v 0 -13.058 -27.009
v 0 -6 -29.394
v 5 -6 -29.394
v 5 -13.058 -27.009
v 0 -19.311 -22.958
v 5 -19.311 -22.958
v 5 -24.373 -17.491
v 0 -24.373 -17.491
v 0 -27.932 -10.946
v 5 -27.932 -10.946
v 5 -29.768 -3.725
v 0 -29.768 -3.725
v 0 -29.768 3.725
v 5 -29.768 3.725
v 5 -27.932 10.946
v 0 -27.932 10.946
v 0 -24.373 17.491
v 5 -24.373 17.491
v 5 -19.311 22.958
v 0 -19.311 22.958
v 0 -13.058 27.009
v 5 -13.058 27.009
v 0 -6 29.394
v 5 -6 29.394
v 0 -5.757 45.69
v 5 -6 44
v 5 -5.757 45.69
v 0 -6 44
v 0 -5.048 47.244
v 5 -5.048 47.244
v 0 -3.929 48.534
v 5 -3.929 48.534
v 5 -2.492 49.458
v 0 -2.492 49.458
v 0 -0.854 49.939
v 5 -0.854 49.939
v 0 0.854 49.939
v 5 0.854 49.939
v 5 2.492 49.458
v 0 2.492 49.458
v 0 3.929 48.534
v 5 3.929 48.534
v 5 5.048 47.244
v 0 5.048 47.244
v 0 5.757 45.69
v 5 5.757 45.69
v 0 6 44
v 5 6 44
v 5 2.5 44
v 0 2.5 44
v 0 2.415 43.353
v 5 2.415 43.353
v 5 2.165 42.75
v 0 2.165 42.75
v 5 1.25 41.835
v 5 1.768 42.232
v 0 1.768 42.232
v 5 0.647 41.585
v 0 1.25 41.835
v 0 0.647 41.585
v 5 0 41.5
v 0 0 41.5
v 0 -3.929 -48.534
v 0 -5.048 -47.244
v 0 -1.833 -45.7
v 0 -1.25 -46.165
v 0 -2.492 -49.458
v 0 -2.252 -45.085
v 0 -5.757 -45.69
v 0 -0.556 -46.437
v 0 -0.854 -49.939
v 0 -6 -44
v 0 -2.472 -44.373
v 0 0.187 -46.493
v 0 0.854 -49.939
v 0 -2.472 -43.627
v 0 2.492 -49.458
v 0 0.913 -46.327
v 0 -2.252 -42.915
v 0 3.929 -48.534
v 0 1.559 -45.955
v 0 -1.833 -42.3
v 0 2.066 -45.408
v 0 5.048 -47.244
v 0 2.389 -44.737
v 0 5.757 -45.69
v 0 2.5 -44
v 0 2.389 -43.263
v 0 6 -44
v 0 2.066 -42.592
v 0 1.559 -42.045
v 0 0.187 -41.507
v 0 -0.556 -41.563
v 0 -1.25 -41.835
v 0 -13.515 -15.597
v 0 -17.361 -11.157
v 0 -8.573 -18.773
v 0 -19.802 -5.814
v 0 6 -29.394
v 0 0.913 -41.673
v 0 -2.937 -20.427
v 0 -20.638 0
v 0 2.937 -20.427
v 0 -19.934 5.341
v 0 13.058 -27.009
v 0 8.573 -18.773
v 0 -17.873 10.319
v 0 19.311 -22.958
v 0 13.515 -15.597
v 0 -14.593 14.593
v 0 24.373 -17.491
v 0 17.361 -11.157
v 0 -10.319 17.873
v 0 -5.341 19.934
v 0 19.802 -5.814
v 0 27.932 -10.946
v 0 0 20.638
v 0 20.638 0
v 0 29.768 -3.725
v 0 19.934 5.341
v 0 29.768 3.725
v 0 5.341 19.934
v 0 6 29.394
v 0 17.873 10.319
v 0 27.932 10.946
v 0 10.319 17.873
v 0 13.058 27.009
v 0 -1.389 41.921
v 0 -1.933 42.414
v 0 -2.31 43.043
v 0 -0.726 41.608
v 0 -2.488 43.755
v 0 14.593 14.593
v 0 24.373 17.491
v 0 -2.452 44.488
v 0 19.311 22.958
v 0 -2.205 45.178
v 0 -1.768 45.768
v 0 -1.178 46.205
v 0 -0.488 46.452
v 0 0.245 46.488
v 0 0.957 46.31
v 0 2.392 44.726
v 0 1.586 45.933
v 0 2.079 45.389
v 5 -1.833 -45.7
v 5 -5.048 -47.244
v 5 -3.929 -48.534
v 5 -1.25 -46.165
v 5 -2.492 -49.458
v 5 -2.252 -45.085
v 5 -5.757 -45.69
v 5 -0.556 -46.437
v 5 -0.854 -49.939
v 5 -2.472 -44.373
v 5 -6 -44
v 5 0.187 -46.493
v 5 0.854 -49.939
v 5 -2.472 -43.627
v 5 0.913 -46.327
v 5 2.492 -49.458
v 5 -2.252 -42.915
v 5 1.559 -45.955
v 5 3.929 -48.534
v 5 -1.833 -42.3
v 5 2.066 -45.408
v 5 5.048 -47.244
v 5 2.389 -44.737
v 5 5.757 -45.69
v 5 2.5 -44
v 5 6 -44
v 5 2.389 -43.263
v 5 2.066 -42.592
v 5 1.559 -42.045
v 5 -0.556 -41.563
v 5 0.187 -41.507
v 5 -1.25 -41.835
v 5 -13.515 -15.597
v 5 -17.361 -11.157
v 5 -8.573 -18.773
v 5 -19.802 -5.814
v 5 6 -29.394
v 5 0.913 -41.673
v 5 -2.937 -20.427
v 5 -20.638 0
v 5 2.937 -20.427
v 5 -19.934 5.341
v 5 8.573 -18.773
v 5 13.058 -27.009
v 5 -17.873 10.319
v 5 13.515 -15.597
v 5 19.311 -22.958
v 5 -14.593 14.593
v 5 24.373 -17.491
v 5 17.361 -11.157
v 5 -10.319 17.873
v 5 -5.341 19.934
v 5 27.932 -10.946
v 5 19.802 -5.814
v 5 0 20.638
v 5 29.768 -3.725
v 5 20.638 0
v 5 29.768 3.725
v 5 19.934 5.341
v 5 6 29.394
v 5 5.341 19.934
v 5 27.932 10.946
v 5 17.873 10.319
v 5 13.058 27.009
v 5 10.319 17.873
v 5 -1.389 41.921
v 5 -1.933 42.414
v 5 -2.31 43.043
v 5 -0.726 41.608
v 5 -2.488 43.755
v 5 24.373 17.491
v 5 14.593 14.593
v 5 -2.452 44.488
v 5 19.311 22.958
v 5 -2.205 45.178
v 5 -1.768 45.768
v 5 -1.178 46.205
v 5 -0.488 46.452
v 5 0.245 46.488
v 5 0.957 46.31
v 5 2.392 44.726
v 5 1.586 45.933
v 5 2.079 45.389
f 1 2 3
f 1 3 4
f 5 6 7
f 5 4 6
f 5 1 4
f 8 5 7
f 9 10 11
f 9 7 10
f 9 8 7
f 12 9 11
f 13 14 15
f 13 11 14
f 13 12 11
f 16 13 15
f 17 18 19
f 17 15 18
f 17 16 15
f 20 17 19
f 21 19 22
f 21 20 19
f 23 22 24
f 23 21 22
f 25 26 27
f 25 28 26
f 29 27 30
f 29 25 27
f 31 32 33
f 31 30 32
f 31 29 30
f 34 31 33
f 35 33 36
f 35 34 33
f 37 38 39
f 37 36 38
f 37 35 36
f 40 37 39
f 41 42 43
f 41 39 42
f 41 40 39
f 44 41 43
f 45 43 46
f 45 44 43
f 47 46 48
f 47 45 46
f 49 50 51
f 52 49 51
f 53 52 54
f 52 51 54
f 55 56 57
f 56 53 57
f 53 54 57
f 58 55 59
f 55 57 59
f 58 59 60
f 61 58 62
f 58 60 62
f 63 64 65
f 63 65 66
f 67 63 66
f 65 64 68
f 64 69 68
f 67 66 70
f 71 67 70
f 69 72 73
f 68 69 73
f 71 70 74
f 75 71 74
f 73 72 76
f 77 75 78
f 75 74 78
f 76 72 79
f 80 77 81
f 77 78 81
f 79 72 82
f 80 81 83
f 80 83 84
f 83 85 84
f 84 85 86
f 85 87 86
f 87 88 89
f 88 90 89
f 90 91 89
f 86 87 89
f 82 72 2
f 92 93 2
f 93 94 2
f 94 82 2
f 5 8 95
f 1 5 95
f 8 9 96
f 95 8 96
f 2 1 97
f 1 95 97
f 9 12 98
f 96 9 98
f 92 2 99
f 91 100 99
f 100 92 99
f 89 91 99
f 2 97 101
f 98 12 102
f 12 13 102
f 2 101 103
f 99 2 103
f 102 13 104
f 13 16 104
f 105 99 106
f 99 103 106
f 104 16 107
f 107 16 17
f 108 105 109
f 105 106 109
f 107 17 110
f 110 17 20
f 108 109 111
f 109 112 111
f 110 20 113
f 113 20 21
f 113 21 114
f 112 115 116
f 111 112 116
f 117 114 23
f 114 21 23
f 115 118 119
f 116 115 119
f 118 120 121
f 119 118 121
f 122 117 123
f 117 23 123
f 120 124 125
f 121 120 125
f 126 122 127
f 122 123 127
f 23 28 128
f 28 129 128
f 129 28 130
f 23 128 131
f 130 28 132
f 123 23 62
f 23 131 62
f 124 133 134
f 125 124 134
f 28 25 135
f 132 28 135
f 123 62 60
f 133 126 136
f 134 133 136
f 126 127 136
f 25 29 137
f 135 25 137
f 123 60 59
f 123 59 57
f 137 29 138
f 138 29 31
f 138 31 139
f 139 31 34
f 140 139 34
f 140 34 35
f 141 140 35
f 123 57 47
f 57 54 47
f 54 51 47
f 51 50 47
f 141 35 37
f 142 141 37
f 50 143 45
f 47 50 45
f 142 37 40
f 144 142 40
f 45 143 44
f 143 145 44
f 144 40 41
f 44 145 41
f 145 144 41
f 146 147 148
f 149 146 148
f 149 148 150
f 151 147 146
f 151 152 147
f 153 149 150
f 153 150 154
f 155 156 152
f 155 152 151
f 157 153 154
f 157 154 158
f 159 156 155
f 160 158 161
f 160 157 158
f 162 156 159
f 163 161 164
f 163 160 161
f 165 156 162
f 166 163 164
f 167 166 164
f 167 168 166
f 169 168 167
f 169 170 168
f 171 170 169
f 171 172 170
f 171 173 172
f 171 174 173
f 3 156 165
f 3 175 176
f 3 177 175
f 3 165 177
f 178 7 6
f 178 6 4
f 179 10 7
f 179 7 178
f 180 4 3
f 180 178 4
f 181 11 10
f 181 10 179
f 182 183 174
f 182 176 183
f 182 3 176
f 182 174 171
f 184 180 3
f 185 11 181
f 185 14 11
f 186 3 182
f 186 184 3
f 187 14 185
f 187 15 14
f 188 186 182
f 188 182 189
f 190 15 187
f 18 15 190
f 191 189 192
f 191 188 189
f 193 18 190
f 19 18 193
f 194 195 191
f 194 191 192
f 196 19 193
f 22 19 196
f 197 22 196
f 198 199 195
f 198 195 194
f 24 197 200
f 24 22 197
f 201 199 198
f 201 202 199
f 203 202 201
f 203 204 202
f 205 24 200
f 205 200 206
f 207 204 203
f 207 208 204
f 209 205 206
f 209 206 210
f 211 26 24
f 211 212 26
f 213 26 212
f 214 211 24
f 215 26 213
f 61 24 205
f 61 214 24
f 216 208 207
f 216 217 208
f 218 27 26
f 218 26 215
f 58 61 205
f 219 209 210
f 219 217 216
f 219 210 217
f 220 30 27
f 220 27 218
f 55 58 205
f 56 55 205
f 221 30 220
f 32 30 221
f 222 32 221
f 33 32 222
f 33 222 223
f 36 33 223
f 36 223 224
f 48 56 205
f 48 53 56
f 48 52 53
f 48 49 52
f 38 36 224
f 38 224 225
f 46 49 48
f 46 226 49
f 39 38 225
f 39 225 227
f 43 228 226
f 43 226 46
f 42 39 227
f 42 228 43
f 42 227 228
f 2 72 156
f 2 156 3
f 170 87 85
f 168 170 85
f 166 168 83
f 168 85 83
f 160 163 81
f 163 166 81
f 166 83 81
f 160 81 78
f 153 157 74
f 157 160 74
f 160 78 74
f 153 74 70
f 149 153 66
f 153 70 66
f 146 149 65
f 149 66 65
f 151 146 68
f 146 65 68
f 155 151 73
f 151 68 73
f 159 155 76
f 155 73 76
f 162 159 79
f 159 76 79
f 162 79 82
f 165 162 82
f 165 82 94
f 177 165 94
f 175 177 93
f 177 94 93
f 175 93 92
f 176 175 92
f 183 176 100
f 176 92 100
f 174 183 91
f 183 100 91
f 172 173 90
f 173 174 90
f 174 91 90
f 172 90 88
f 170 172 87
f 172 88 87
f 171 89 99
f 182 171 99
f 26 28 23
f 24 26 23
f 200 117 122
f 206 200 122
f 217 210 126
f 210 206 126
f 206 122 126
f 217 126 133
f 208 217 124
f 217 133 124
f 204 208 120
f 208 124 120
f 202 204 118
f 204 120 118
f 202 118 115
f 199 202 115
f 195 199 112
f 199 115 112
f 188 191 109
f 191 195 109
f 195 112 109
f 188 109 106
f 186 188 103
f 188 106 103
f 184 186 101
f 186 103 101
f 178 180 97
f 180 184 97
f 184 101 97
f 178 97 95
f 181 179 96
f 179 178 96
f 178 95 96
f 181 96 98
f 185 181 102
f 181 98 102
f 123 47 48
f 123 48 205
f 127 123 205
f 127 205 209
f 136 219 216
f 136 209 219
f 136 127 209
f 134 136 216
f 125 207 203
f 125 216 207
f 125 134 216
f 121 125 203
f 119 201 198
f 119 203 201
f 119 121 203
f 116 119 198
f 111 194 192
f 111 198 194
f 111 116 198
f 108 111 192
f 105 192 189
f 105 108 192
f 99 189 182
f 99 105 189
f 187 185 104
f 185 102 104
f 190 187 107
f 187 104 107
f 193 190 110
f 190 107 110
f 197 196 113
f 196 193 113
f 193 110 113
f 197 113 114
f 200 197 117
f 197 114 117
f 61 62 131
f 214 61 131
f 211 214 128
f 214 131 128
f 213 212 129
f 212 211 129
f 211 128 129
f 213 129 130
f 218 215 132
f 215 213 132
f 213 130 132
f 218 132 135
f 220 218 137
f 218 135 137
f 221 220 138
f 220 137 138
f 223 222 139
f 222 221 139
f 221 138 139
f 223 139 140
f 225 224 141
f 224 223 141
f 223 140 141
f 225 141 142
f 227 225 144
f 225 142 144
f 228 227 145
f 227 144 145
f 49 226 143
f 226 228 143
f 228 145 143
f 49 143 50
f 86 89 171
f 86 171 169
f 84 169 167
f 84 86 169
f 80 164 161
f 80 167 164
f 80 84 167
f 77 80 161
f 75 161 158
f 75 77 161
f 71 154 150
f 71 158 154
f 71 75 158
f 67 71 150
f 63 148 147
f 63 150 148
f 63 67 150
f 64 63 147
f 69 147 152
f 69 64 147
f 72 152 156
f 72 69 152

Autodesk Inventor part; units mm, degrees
ref_plane "YZ Plane" through (0, 0, 0) normal (1, 0, 0) x (0, 1, 0)
ref_plane "XZ Plane" through (0, 0, 0) normal (0, 1, 0) x (-1, 0, 0)
ref_plane "XY Plane" through (0, 0, 0) normal (0, 0, 1) x (1, 0, 0)
sketch "Sketch1" plane through (0, 0, 0) normal (1, 0, 0) x (0, 1, 0)
  circle A0 centre (0, 0) radius 10
  circle A1 centre (0, 0) radius 20.6375
  line L0 (0, 0) -> (0, 44)
  circle A2 centre (0, 44) radius 2.5
  line L1 (20.6375, 0) -> (-20.6375, 0)
  arc A3 (6, 44) -> (-6, 44) centre (0, 44) ccw
  line L2 (6, 44) -> (6, 29.3939)
  line L3 (-6, 44) -> (-6, 29.3939)
  circle A4 centre (0, -44) radius 2.5
  arc A5 (-6, -44) -> (6, -44) centre (0, -44) ccw
  line L4 (6, -44) -> (6, -29.3939)
  line L5 (-6, -44) -> (-6, -29.3939)
  arc A6 (-6, 29.3939) -> (-6, -29.3939) centre (0, 0) ccw
  arc A7 (6, -29.3939) -> (6, 29.3939) centre (0, 0) ccw
  dimension "d0" = 20
  dimension "d1" = 41.275
  dimension "d5" = 44
  dimension "d6" = 5
  dimension "d7" = 12
extrude "Extrusion1" add sketch "Sketch1" along normal blind 5
properties part number "Sujetador_Rodamiento"
